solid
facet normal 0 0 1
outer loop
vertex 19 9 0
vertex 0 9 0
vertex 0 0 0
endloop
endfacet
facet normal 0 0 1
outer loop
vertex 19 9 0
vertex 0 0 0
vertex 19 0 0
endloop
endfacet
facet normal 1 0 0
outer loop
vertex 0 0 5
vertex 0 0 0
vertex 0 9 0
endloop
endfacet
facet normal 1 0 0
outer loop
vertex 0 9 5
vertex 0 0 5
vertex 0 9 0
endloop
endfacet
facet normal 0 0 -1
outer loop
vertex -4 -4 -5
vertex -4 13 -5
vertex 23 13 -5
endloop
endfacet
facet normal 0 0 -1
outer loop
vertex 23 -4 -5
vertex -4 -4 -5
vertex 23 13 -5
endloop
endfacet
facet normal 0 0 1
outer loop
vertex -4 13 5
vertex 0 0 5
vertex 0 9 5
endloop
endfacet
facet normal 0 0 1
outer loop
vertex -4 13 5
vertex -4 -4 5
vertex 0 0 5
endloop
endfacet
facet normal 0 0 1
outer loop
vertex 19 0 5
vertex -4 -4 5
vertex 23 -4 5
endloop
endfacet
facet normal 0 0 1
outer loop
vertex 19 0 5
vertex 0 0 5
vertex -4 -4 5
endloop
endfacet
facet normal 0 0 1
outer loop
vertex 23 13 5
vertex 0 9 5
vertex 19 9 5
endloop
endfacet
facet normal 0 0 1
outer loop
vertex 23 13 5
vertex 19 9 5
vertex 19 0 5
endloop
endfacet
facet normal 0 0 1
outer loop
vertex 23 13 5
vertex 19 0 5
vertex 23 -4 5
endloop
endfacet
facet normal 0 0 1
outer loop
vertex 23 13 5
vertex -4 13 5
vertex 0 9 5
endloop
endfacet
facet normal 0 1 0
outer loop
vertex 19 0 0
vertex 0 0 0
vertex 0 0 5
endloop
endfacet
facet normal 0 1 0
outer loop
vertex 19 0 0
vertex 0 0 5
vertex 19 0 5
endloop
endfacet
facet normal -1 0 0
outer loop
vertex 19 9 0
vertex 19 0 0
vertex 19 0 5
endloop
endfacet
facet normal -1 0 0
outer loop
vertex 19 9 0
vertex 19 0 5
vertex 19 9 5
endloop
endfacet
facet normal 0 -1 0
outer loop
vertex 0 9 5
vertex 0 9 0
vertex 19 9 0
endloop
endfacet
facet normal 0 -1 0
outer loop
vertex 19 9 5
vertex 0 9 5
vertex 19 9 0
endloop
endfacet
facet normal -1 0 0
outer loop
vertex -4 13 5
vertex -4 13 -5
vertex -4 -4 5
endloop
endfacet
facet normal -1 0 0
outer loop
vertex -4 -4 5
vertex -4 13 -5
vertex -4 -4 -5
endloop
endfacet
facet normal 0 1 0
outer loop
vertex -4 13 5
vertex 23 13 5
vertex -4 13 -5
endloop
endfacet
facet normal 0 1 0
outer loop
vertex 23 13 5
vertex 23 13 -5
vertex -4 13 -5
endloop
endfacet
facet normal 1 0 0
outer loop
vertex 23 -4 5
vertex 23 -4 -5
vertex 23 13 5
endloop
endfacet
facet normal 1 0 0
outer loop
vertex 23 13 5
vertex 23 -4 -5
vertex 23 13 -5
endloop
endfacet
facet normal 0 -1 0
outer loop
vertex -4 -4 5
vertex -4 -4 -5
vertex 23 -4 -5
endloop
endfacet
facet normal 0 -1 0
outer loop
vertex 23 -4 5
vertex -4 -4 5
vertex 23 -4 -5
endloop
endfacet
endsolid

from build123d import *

# Parameters (mm, degrees)
F0_W     = 19
F0_H     = 9
F1_DEPTH = 5
F2_DEPTH = 5


with BuildPart() as f1:
    # F0 (on Top) → F1 (new body)
    with BuildSketch(Plane.XY):
        Polygon((23, -4), (23, 0), (23, 13), (-4, 13), (-4, -4), align=None)
        with Locations((9.5, 4.5)):
            Rectangle(F0_W, F0_H, mode=Mode.SUBTRACT)
        with Locations((9.5, 4.5)):
            Rectangle(F0_W, F0_H)
    extrude(amount=-F1_DEPTH)

    # F0 (on Top) → F2 (join)
    with BuildSketch(Plane.XY):
        Polygon((23, -4), (23, 0), (23, 13), (-4, 13), (-4, -4), align=None)
        with Locations((9.5, 4.5)):
            Rectangle(F0_W, F0_H, mode=Mode.SUBTRACT)
    extrude(amount=F2_DEPTH)


solid = f1.part
